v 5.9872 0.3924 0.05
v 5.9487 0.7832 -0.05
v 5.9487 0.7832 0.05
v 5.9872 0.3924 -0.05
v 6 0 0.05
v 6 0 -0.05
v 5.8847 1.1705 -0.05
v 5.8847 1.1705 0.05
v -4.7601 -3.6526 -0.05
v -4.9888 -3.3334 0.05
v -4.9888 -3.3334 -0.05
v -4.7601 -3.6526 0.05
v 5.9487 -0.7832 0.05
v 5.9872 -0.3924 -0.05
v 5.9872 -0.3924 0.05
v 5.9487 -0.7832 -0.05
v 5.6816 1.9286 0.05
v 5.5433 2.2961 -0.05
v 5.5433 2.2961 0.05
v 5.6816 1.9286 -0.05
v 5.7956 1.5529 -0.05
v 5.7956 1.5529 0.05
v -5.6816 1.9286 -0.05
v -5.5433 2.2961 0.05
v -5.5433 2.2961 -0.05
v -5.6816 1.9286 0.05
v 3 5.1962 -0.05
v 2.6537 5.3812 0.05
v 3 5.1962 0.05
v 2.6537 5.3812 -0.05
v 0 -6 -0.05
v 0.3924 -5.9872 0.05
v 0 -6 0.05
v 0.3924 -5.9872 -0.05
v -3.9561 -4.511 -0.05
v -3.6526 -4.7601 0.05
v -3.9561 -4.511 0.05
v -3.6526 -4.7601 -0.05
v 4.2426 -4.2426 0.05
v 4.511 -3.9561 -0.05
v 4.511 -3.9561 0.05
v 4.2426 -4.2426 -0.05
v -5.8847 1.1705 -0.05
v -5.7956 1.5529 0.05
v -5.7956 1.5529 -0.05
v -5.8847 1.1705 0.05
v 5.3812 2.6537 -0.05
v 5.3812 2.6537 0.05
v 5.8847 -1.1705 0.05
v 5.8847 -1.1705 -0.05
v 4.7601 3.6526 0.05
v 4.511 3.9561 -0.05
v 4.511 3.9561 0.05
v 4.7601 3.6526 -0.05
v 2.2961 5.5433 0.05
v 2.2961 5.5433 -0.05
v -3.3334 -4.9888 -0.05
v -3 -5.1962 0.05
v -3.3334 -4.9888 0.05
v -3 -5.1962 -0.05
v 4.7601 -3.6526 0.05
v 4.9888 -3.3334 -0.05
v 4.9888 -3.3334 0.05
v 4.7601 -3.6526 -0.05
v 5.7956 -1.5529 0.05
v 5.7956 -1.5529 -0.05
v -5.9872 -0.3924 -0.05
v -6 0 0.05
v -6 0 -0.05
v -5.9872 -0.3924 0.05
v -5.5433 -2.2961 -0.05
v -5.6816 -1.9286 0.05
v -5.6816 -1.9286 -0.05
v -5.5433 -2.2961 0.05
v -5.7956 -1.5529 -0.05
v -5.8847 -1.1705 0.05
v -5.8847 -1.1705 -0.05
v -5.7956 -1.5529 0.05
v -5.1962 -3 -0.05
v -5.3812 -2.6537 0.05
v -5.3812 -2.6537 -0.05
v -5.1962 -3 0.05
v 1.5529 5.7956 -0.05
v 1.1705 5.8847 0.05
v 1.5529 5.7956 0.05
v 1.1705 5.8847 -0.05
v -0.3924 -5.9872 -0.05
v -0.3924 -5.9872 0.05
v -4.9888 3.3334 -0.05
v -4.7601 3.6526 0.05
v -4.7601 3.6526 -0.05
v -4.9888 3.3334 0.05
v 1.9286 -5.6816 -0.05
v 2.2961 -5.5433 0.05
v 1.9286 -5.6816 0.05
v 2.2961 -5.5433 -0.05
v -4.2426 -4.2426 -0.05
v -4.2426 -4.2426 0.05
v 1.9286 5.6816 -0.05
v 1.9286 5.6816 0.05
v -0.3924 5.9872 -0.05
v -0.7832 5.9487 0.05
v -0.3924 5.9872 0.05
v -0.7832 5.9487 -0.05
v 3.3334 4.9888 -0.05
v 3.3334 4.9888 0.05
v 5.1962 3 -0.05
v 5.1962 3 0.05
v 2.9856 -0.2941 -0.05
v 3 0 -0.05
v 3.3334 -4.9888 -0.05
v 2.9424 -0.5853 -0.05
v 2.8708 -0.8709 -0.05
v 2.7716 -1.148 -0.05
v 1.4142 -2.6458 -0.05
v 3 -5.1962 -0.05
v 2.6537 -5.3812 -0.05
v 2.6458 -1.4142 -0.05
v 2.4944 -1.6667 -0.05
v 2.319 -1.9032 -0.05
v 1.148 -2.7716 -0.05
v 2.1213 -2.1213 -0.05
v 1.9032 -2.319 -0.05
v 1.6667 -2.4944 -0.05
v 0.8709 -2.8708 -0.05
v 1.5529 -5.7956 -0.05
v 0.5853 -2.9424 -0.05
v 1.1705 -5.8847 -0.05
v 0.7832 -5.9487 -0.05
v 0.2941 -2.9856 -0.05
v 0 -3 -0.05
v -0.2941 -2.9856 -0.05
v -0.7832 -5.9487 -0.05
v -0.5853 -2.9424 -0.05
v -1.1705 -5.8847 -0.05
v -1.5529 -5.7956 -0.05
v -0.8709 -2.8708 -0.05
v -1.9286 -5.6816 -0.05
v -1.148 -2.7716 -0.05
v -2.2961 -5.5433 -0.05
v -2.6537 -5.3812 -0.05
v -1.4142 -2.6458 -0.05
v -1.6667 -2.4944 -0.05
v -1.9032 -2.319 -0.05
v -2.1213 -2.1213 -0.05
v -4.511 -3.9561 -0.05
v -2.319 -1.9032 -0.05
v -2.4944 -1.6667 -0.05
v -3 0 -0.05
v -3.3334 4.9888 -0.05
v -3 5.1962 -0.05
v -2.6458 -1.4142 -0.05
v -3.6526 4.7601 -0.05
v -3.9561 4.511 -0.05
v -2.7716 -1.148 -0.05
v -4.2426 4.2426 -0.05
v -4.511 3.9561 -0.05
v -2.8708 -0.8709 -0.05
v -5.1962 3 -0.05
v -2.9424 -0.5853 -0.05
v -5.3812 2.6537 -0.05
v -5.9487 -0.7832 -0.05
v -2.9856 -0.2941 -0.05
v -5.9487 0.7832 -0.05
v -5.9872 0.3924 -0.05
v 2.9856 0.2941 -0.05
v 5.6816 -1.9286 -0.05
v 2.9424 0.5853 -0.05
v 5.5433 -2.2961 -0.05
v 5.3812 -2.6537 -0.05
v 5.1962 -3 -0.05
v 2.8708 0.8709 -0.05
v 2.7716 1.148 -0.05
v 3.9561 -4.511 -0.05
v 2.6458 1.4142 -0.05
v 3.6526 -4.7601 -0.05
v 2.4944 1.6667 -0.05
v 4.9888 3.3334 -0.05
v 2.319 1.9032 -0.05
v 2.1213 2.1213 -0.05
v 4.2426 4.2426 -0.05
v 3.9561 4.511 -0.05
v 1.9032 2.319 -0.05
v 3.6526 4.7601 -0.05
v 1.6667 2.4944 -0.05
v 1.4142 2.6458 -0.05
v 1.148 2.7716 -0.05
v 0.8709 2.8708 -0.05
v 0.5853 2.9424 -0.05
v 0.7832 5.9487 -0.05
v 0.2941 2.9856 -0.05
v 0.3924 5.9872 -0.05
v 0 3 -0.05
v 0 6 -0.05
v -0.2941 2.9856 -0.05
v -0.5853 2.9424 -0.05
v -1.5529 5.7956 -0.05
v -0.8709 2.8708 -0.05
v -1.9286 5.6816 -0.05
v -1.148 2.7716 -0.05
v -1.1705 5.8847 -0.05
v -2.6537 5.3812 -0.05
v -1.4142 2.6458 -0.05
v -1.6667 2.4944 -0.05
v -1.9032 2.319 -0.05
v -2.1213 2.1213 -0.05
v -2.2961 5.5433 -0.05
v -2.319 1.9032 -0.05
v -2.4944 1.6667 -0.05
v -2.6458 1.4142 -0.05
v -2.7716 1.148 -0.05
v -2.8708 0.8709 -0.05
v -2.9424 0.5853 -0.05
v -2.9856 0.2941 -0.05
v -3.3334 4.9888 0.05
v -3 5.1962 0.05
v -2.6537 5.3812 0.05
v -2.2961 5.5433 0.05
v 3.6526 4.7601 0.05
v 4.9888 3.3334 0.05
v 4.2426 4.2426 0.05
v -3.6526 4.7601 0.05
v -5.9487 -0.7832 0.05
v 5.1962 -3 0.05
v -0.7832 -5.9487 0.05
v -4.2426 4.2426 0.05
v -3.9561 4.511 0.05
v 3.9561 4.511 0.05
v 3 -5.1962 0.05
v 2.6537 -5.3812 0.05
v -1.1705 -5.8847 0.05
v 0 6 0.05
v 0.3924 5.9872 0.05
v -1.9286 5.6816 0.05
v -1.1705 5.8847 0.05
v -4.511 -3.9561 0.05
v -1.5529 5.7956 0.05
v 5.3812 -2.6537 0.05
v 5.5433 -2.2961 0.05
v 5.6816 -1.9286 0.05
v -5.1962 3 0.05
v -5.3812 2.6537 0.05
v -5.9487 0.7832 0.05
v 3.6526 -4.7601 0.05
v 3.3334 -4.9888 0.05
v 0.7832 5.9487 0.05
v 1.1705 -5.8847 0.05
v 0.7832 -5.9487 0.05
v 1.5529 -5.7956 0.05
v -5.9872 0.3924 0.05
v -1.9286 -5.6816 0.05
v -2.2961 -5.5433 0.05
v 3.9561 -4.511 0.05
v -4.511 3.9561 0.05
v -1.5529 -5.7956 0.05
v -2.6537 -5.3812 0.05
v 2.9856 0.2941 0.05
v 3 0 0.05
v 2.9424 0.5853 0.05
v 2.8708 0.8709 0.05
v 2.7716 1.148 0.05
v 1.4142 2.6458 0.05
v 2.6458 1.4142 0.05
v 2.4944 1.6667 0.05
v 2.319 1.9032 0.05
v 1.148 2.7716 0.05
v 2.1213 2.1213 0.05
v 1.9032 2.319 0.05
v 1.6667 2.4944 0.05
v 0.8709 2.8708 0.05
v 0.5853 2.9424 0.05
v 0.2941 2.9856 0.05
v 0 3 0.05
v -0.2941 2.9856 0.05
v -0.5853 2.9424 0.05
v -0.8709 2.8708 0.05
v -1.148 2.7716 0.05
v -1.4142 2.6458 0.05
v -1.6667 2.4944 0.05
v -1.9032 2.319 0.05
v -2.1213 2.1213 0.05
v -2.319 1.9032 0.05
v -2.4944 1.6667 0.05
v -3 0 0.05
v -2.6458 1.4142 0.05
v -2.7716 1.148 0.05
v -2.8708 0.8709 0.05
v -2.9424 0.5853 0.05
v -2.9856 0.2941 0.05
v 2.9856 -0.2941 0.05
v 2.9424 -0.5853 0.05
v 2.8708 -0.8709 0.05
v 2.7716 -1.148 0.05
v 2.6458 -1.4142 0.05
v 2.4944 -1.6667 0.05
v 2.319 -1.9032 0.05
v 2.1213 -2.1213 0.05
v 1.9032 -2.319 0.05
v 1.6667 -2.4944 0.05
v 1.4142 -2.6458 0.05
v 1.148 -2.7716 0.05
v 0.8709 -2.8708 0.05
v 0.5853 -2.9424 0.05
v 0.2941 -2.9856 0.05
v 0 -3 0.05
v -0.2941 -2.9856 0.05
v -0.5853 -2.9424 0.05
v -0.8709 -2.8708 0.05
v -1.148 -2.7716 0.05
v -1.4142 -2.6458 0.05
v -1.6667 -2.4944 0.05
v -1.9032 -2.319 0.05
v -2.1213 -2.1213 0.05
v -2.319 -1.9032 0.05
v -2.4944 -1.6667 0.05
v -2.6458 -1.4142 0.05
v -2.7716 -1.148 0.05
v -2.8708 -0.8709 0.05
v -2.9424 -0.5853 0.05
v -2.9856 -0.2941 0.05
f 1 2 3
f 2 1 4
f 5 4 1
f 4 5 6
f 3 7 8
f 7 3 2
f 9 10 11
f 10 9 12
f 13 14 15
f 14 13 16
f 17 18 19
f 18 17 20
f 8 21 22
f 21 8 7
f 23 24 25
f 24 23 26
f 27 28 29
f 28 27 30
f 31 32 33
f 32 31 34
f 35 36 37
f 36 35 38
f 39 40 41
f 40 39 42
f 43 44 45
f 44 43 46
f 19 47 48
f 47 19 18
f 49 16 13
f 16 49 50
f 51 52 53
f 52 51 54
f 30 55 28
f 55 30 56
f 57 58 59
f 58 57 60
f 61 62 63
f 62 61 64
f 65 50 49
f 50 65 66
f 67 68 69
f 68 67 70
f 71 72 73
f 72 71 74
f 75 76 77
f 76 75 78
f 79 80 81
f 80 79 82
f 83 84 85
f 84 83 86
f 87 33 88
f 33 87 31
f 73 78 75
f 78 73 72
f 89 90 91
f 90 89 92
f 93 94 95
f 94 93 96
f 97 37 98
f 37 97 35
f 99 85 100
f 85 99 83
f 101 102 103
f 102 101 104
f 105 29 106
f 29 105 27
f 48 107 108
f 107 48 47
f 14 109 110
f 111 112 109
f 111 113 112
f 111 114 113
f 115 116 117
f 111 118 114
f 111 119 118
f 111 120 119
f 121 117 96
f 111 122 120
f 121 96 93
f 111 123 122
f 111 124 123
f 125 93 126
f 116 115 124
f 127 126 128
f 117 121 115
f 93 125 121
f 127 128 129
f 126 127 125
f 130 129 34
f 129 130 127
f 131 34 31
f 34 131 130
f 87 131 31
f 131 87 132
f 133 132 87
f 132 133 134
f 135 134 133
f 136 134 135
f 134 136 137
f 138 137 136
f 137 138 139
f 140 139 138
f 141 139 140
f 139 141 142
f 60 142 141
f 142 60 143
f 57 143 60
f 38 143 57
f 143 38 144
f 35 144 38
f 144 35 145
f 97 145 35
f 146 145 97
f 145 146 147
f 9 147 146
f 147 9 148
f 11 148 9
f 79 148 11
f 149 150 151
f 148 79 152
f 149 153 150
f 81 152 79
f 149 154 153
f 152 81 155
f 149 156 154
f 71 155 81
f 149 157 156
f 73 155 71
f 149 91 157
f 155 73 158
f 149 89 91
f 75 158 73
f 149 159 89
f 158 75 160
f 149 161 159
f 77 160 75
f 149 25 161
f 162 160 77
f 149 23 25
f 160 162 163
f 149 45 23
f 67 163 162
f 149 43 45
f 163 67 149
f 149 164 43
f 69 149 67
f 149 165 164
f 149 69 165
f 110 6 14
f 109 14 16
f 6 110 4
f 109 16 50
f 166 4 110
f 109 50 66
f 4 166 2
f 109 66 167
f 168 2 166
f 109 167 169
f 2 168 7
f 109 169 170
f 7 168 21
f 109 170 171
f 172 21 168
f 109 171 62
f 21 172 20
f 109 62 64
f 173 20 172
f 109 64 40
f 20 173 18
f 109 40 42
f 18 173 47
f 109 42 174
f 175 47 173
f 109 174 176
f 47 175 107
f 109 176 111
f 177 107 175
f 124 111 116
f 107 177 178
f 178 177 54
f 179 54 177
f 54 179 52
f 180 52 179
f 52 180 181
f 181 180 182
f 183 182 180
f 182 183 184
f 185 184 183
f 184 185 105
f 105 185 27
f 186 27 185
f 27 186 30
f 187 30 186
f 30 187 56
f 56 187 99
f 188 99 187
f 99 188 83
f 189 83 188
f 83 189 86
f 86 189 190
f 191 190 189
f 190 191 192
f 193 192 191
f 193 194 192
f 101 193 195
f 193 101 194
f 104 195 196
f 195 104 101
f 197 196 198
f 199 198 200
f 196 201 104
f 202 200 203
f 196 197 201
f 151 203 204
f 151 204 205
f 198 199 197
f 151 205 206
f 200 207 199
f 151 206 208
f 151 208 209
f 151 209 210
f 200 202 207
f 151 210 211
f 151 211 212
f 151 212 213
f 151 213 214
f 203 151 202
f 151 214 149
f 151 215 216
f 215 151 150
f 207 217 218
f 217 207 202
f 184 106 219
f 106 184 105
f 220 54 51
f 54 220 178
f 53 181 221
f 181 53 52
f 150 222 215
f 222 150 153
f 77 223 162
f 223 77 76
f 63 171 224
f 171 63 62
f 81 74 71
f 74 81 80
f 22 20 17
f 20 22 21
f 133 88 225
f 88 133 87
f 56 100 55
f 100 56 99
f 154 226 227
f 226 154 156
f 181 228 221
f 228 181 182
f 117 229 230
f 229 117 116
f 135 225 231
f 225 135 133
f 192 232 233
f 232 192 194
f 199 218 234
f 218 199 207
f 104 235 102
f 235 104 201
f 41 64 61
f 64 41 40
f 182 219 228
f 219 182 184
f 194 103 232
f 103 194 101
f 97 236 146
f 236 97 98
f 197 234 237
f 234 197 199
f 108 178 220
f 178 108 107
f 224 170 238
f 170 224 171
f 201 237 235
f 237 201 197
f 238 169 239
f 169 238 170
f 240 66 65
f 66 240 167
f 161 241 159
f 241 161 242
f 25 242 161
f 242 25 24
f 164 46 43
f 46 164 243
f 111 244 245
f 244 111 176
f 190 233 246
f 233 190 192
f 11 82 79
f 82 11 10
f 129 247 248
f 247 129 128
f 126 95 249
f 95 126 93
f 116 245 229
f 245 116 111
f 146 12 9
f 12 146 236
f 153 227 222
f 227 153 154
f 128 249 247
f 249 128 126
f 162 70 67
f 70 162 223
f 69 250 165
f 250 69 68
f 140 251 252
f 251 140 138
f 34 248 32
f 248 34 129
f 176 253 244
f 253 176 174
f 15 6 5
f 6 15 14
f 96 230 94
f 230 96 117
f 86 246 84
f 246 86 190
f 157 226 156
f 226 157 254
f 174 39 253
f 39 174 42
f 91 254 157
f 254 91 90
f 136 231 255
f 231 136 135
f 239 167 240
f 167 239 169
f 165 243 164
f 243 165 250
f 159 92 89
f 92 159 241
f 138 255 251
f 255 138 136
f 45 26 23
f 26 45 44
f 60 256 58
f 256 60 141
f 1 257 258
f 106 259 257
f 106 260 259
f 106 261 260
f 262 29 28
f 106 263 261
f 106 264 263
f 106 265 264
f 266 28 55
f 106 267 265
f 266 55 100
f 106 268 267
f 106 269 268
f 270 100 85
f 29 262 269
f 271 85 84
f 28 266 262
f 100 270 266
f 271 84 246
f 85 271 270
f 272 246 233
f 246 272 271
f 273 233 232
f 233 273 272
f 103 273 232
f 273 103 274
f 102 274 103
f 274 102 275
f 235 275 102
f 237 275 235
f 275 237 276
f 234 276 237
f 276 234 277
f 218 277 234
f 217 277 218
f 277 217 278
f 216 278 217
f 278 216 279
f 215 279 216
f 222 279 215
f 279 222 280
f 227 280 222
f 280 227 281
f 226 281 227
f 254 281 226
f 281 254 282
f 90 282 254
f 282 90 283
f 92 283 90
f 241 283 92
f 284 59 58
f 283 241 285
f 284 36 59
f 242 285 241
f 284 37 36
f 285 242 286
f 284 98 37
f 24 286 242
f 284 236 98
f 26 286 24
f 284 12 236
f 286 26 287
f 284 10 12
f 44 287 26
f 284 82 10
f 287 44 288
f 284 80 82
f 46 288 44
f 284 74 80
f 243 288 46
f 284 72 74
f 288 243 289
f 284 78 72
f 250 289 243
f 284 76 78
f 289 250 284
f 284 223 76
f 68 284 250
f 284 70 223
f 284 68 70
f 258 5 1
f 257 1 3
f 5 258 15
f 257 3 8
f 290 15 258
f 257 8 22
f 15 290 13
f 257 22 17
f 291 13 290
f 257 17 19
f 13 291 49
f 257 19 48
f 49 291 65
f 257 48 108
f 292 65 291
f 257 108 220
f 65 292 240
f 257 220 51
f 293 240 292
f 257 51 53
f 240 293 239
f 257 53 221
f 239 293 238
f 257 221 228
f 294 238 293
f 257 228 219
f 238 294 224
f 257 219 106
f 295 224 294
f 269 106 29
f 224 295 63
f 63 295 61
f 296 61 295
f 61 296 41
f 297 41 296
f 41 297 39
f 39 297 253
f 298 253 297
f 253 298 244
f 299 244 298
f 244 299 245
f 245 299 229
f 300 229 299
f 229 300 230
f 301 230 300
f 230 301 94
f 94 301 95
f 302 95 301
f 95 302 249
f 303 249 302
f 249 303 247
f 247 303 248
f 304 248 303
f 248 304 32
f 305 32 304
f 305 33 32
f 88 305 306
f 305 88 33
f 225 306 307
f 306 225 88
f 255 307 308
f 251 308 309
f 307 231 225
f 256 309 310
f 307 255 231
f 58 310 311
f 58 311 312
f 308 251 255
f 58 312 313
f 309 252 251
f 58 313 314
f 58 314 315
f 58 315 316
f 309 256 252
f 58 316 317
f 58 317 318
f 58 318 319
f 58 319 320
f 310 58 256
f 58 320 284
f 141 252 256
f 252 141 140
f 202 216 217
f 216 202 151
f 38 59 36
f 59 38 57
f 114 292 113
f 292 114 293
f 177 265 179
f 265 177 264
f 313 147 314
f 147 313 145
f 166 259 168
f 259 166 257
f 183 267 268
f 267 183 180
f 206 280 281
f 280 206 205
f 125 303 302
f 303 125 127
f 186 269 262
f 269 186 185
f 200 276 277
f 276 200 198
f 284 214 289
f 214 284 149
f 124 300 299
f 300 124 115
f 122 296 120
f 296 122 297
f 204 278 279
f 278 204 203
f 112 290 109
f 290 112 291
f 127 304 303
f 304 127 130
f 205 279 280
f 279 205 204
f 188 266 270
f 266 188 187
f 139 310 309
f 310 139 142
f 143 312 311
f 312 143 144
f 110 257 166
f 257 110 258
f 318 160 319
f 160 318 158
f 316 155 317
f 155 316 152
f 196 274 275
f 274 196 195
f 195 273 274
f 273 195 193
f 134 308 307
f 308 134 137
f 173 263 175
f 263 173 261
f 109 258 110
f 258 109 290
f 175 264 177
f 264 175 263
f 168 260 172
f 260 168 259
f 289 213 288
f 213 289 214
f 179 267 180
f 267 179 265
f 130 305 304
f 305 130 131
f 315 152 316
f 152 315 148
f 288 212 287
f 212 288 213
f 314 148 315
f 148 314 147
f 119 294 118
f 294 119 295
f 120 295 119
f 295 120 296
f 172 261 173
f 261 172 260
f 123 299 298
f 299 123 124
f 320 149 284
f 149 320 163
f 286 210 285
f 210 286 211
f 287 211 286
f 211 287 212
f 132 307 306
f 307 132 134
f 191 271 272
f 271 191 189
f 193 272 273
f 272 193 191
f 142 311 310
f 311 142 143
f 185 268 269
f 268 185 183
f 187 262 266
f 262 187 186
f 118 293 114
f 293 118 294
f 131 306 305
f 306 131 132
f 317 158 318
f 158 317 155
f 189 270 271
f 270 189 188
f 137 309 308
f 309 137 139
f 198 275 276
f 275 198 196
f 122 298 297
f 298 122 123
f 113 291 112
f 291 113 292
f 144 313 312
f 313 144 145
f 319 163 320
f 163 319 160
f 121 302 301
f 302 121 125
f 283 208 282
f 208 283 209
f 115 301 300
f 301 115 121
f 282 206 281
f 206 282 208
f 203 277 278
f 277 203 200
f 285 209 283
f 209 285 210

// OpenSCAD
// part_id: c5
// name: C5 washer
// source_drawing_ids: DRW-004
// units: mm
// SPDX-License-Identifier: MIT
//
// Part C5: simple washer used in the c gear train.
//
// Local origin convention:
// - XY origin is the washer axis.
// - Z origin is the part midplane.

module part_c5(outer_d = 12.0, inner_d = 6.0, thickness = 0.1) {
    difference() {
        cylinder(d = outer_d, h = thickness, center = true, $fn = 96);
        cylinder(d = inner_d, h = thickness + 0.2, center = true, $fn = 64);
    }
}

// ---- "main guard" ----
if (is_undef(__LIB_MODE__)) {
    part_c5();
}
